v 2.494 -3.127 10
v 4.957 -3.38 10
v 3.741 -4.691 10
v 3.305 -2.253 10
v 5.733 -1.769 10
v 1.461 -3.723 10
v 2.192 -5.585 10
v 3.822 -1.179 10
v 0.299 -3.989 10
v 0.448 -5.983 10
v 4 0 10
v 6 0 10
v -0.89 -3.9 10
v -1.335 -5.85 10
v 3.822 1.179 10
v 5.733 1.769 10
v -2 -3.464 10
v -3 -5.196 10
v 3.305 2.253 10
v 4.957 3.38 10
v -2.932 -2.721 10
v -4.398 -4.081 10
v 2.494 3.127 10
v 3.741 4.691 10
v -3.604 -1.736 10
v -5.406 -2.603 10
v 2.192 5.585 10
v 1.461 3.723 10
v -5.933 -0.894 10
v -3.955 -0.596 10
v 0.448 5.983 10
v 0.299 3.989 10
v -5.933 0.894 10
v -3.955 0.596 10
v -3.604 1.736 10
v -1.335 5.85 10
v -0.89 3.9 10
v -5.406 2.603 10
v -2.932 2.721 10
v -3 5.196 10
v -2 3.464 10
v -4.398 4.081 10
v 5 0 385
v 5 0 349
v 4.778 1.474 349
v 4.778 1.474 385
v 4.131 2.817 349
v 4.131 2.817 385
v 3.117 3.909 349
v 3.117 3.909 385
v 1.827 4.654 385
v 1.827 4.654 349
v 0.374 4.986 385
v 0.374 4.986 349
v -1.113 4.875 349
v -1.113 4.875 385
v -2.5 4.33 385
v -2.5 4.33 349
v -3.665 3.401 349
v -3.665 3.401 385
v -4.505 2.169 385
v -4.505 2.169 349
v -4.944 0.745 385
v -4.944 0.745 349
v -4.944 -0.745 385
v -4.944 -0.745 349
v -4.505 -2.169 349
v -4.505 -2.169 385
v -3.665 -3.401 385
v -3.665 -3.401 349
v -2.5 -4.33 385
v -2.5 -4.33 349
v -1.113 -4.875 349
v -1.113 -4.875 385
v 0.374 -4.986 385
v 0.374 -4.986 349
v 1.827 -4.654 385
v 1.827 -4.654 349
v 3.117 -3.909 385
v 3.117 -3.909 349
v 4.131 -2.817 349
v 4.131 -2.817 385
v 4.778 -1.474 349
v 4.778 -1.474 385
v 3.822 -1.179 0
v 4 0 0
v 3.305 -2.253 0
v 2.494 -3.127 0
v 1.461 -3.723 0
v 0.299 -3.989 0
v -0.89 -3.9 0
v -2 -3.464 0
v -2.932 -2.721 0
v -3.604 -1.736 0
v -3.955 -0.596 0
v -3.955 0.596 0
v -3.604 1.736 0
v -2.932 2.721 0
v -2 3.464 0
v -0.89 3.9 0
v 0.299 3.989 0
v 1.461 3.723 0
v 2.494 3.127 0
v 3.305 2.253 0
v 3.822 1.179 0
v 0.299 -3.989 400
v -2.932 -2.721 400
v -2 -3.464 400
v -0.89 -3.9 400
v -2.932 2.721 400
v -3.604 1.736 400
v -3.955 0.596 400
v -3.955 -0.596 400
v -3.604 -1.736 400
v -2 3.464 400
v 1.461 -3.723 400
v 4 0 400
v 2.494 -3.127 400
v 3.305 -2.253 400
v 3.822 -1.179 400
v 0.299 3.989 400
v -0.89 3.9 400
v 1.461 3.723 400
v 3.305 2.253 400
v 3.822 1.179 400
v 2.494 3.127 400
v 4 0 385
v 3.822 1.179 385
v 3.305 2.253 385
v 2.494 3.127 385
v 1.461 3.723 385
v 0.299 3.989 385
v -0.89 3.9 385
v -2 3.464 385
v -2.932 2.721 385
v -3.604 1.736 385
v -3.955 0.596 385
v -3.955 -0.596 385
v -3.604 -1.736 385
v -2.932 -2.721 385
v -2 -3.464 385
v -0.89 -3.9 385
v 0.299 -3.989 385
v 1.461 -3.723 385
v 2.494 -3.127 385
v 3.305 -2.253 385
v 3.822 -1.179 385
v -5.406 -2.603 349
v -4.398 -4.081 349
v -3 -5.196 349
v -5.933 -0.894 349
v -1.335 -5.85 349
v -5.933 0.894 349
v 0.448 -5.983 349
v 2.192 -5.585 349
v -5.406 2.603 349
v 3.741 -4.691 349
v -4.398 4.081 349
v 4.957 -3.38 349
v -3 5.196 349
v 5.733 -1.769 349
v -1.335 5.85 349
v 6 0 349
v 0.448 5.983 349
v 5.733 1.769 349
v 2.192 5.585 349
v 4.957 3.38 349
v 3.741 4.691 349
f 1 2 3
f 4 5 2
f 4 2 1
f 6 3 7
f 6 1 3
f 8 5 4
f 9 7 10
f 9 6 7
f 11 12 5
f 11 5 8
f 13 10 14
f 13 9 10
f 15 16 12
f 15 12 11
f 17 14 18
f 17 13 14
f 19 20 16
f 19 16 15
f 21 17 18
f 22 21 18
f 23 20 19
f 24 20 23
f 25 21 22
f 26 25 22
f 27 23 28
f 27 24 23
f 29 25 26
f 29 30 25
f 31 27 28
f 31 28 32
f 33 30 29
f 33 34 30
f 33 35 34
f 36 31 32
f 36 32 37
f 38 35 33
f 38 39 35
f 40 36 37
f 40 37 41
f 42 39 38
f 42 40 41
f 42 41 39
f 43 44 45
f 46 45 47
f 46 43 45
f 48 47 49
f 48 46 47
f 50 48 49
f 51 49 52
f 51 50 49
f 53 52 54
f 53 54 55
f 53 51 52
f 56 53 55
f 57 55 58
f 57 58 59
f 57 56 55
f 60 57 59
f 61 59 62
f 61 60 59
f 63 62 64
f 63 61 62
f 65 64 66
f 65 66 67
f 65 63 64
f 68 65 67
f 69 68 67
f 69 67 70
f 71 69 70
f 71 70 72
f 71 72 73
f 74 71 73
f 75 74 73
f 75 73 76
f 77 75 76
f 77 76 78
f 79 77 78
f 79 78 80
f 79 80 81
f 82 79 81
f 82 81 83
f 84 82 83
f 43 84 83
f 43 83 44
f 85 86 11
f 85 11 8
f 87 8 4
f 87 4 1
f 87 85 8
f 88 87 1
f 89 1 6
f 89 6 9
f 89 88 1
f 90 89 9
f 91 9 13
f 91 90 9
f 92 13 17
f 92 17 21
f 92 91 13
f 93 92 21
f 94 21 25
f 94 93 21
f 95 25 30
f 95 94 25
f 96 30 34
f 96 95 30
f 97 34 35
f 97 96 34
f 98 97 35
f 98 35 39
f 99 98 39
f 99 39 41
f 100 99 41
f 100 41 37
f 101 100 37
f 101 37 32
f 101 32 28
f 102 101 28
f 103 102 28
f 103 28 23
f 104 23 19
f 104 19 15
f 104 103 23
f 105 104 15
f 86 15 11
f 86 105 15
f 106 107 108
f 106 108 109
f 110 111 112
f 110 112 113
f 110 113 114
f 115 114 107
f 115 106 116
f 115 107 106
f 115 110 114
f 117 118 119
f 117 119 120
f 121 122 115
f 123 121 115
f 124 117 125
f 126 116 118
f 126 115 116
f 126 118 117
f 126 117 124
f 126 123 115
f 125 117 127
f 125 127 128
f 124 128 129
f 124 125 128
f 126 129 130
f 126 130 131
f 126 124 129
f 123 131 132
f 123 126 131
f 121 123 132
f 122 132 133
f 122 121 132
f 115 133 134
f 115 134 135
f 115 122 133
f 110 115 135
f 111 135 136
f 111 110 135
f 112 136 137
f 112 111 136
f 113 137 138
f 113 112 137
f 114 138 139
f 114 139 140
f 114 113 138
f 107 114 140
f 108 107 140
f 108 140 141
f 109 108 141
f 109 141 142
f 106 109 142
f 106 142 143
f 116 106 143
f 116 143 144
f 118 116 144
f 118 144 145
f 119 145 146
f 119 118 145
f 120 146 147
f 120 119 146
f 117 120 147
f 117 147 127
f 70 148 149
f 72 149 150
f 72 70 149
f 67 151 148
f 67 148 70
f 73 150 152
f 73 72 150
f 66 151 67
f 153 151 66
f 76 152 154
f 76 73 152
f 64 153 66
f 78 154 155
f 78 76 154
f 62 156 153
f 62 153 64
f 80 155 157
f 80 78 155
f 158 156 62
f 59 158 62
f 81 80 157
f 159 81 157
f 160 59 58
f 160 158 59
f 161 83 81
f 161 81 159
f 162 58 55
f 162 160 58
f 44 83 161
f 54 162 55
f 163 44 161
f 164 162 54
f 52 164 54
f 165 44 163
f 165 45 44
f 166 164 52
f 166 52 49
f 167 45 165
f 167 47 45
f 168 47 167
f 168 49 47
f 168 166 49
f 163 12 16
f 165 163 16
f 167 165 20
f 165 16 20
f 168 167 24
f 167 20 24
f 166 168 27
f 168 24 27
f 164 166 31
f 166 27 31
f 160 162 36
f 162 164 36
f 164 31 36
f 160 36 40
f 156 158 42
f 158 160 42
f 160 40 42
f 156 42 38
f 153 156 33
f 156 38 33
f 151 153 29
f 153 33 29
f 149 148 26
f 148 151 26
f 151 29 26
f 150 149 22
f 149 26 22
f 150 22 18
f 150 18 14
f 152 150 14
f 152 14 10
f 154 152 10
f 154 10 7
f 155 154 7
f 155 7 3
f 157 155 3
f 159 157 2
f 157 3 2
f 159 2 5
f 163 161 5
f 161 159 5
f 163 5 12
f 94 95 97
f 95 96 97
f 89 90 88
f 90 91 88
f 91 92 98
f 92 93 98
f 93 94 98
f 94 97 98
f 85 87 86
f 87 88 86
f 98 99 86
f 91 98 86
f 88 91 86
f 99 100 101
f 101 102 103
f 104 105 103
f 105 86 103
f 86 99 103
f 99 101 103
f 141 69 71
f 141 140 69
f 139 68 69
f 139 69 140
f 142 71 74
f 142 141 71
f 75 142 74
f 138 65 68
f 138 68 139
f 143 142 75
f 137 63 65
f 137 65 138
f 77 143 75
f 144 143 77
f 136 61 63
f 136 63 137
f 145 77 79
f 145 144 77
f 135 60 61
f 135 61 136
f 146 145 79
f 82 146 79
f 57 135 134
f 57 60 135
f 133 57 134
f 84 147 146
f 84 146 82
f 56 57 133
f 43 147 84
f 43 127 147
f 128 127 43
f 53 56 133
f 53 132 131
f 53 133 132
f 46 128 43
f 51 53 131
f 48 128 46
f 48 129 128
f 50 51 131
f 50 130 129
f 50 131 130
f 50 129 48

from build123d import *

# Parameters (mm, degrees)
SKETCH_1_R          = 6
EXTRUDE_1_DEPTH     = 400
SKETCH_2_OUTSIDE_W  = 94.072
SKETCH_2_OUTSIDE_H  = 94.072
SKETCH_2_OUTSIDE_R  = 5
CUT_EXTRUDE_1_DEPTH = 51
SKETCH_4_OUTSIDE_W  = 94.072
SKETCH_4_OUTSIDE_H  = 94.072
SKETCH_4_OUTSIDE_R  = 4
CUT_EXTRUDE_3_DEPTH = 15
SKETCH_5_OUTSIDE_W  = 94.072
SKETCH_5_OUTSIDE_H  = 94.072
SKETCH_5_OUTSIDE_R  = 4
CUT_EXTRUDE_4_DEPTH = 10


with BuildPart() as part:
    # Эскиз1 → Бобышка-Вытянуть1 (new body)
    with BuildSketch(Plane.XY):
        Circle(SKETCH_1_R)
    extrude(amount=EXTRUDE_1_DEPTH)

    # Эскиз2 outside → Вырез-Вытянуть1 (cut)
    with BuildSketch(Plane.XY.offset(400)):
        Rectangle(SKETCH_2_OUTSIDE_W, SKETCH_2_OUTSIDE_H)
        Circle(SKETCH_2_OUTSIDE_R, mode=Mode.SUBTRACT)
    extrude(amount=-CUT_EXTRUDE_1_DEPTH, mode=Mode.SUBTRACT)

    # Эскиз4 outside → Вырез-Вытянуть3 (cut)
    with BuildSketch(Plane.XY.offset(400)):
        Rectangle(SKETCH_4_OUTSIDE_W, SKETCH_4_OUTSIDE_H)
        Circle(SKETCH_4_OUTSIDE_R, mode=Mode.SUBTRACT)
    extrude(amount=-CUT_EXTRUDE_3_DEPTH, mode=Mode.SUBTRACT)

    # Эскиз5 outside → Вырез-Вытянуть4 (cut)
    with BuildSketch(Plane(origin=(0, 0, 0), x_dir=(-1, 0, 0), z_dir=(0, 0, -1))):
        Rectangle(SKETCH_5_OUTSIDE_W, SKETCH_5_OUTSIDE_H)
        with Locations(Location((0, 0, 0), (0, 0, 180))):
            Circle(SKETCH_5_OUTSIDE_R, mode=Mode.SUBTRACT)
    extrude(amount=-CUT_EXTRUDE_4_DEPTH, mode=Mode.SUBTRACT)


solid = part.part
